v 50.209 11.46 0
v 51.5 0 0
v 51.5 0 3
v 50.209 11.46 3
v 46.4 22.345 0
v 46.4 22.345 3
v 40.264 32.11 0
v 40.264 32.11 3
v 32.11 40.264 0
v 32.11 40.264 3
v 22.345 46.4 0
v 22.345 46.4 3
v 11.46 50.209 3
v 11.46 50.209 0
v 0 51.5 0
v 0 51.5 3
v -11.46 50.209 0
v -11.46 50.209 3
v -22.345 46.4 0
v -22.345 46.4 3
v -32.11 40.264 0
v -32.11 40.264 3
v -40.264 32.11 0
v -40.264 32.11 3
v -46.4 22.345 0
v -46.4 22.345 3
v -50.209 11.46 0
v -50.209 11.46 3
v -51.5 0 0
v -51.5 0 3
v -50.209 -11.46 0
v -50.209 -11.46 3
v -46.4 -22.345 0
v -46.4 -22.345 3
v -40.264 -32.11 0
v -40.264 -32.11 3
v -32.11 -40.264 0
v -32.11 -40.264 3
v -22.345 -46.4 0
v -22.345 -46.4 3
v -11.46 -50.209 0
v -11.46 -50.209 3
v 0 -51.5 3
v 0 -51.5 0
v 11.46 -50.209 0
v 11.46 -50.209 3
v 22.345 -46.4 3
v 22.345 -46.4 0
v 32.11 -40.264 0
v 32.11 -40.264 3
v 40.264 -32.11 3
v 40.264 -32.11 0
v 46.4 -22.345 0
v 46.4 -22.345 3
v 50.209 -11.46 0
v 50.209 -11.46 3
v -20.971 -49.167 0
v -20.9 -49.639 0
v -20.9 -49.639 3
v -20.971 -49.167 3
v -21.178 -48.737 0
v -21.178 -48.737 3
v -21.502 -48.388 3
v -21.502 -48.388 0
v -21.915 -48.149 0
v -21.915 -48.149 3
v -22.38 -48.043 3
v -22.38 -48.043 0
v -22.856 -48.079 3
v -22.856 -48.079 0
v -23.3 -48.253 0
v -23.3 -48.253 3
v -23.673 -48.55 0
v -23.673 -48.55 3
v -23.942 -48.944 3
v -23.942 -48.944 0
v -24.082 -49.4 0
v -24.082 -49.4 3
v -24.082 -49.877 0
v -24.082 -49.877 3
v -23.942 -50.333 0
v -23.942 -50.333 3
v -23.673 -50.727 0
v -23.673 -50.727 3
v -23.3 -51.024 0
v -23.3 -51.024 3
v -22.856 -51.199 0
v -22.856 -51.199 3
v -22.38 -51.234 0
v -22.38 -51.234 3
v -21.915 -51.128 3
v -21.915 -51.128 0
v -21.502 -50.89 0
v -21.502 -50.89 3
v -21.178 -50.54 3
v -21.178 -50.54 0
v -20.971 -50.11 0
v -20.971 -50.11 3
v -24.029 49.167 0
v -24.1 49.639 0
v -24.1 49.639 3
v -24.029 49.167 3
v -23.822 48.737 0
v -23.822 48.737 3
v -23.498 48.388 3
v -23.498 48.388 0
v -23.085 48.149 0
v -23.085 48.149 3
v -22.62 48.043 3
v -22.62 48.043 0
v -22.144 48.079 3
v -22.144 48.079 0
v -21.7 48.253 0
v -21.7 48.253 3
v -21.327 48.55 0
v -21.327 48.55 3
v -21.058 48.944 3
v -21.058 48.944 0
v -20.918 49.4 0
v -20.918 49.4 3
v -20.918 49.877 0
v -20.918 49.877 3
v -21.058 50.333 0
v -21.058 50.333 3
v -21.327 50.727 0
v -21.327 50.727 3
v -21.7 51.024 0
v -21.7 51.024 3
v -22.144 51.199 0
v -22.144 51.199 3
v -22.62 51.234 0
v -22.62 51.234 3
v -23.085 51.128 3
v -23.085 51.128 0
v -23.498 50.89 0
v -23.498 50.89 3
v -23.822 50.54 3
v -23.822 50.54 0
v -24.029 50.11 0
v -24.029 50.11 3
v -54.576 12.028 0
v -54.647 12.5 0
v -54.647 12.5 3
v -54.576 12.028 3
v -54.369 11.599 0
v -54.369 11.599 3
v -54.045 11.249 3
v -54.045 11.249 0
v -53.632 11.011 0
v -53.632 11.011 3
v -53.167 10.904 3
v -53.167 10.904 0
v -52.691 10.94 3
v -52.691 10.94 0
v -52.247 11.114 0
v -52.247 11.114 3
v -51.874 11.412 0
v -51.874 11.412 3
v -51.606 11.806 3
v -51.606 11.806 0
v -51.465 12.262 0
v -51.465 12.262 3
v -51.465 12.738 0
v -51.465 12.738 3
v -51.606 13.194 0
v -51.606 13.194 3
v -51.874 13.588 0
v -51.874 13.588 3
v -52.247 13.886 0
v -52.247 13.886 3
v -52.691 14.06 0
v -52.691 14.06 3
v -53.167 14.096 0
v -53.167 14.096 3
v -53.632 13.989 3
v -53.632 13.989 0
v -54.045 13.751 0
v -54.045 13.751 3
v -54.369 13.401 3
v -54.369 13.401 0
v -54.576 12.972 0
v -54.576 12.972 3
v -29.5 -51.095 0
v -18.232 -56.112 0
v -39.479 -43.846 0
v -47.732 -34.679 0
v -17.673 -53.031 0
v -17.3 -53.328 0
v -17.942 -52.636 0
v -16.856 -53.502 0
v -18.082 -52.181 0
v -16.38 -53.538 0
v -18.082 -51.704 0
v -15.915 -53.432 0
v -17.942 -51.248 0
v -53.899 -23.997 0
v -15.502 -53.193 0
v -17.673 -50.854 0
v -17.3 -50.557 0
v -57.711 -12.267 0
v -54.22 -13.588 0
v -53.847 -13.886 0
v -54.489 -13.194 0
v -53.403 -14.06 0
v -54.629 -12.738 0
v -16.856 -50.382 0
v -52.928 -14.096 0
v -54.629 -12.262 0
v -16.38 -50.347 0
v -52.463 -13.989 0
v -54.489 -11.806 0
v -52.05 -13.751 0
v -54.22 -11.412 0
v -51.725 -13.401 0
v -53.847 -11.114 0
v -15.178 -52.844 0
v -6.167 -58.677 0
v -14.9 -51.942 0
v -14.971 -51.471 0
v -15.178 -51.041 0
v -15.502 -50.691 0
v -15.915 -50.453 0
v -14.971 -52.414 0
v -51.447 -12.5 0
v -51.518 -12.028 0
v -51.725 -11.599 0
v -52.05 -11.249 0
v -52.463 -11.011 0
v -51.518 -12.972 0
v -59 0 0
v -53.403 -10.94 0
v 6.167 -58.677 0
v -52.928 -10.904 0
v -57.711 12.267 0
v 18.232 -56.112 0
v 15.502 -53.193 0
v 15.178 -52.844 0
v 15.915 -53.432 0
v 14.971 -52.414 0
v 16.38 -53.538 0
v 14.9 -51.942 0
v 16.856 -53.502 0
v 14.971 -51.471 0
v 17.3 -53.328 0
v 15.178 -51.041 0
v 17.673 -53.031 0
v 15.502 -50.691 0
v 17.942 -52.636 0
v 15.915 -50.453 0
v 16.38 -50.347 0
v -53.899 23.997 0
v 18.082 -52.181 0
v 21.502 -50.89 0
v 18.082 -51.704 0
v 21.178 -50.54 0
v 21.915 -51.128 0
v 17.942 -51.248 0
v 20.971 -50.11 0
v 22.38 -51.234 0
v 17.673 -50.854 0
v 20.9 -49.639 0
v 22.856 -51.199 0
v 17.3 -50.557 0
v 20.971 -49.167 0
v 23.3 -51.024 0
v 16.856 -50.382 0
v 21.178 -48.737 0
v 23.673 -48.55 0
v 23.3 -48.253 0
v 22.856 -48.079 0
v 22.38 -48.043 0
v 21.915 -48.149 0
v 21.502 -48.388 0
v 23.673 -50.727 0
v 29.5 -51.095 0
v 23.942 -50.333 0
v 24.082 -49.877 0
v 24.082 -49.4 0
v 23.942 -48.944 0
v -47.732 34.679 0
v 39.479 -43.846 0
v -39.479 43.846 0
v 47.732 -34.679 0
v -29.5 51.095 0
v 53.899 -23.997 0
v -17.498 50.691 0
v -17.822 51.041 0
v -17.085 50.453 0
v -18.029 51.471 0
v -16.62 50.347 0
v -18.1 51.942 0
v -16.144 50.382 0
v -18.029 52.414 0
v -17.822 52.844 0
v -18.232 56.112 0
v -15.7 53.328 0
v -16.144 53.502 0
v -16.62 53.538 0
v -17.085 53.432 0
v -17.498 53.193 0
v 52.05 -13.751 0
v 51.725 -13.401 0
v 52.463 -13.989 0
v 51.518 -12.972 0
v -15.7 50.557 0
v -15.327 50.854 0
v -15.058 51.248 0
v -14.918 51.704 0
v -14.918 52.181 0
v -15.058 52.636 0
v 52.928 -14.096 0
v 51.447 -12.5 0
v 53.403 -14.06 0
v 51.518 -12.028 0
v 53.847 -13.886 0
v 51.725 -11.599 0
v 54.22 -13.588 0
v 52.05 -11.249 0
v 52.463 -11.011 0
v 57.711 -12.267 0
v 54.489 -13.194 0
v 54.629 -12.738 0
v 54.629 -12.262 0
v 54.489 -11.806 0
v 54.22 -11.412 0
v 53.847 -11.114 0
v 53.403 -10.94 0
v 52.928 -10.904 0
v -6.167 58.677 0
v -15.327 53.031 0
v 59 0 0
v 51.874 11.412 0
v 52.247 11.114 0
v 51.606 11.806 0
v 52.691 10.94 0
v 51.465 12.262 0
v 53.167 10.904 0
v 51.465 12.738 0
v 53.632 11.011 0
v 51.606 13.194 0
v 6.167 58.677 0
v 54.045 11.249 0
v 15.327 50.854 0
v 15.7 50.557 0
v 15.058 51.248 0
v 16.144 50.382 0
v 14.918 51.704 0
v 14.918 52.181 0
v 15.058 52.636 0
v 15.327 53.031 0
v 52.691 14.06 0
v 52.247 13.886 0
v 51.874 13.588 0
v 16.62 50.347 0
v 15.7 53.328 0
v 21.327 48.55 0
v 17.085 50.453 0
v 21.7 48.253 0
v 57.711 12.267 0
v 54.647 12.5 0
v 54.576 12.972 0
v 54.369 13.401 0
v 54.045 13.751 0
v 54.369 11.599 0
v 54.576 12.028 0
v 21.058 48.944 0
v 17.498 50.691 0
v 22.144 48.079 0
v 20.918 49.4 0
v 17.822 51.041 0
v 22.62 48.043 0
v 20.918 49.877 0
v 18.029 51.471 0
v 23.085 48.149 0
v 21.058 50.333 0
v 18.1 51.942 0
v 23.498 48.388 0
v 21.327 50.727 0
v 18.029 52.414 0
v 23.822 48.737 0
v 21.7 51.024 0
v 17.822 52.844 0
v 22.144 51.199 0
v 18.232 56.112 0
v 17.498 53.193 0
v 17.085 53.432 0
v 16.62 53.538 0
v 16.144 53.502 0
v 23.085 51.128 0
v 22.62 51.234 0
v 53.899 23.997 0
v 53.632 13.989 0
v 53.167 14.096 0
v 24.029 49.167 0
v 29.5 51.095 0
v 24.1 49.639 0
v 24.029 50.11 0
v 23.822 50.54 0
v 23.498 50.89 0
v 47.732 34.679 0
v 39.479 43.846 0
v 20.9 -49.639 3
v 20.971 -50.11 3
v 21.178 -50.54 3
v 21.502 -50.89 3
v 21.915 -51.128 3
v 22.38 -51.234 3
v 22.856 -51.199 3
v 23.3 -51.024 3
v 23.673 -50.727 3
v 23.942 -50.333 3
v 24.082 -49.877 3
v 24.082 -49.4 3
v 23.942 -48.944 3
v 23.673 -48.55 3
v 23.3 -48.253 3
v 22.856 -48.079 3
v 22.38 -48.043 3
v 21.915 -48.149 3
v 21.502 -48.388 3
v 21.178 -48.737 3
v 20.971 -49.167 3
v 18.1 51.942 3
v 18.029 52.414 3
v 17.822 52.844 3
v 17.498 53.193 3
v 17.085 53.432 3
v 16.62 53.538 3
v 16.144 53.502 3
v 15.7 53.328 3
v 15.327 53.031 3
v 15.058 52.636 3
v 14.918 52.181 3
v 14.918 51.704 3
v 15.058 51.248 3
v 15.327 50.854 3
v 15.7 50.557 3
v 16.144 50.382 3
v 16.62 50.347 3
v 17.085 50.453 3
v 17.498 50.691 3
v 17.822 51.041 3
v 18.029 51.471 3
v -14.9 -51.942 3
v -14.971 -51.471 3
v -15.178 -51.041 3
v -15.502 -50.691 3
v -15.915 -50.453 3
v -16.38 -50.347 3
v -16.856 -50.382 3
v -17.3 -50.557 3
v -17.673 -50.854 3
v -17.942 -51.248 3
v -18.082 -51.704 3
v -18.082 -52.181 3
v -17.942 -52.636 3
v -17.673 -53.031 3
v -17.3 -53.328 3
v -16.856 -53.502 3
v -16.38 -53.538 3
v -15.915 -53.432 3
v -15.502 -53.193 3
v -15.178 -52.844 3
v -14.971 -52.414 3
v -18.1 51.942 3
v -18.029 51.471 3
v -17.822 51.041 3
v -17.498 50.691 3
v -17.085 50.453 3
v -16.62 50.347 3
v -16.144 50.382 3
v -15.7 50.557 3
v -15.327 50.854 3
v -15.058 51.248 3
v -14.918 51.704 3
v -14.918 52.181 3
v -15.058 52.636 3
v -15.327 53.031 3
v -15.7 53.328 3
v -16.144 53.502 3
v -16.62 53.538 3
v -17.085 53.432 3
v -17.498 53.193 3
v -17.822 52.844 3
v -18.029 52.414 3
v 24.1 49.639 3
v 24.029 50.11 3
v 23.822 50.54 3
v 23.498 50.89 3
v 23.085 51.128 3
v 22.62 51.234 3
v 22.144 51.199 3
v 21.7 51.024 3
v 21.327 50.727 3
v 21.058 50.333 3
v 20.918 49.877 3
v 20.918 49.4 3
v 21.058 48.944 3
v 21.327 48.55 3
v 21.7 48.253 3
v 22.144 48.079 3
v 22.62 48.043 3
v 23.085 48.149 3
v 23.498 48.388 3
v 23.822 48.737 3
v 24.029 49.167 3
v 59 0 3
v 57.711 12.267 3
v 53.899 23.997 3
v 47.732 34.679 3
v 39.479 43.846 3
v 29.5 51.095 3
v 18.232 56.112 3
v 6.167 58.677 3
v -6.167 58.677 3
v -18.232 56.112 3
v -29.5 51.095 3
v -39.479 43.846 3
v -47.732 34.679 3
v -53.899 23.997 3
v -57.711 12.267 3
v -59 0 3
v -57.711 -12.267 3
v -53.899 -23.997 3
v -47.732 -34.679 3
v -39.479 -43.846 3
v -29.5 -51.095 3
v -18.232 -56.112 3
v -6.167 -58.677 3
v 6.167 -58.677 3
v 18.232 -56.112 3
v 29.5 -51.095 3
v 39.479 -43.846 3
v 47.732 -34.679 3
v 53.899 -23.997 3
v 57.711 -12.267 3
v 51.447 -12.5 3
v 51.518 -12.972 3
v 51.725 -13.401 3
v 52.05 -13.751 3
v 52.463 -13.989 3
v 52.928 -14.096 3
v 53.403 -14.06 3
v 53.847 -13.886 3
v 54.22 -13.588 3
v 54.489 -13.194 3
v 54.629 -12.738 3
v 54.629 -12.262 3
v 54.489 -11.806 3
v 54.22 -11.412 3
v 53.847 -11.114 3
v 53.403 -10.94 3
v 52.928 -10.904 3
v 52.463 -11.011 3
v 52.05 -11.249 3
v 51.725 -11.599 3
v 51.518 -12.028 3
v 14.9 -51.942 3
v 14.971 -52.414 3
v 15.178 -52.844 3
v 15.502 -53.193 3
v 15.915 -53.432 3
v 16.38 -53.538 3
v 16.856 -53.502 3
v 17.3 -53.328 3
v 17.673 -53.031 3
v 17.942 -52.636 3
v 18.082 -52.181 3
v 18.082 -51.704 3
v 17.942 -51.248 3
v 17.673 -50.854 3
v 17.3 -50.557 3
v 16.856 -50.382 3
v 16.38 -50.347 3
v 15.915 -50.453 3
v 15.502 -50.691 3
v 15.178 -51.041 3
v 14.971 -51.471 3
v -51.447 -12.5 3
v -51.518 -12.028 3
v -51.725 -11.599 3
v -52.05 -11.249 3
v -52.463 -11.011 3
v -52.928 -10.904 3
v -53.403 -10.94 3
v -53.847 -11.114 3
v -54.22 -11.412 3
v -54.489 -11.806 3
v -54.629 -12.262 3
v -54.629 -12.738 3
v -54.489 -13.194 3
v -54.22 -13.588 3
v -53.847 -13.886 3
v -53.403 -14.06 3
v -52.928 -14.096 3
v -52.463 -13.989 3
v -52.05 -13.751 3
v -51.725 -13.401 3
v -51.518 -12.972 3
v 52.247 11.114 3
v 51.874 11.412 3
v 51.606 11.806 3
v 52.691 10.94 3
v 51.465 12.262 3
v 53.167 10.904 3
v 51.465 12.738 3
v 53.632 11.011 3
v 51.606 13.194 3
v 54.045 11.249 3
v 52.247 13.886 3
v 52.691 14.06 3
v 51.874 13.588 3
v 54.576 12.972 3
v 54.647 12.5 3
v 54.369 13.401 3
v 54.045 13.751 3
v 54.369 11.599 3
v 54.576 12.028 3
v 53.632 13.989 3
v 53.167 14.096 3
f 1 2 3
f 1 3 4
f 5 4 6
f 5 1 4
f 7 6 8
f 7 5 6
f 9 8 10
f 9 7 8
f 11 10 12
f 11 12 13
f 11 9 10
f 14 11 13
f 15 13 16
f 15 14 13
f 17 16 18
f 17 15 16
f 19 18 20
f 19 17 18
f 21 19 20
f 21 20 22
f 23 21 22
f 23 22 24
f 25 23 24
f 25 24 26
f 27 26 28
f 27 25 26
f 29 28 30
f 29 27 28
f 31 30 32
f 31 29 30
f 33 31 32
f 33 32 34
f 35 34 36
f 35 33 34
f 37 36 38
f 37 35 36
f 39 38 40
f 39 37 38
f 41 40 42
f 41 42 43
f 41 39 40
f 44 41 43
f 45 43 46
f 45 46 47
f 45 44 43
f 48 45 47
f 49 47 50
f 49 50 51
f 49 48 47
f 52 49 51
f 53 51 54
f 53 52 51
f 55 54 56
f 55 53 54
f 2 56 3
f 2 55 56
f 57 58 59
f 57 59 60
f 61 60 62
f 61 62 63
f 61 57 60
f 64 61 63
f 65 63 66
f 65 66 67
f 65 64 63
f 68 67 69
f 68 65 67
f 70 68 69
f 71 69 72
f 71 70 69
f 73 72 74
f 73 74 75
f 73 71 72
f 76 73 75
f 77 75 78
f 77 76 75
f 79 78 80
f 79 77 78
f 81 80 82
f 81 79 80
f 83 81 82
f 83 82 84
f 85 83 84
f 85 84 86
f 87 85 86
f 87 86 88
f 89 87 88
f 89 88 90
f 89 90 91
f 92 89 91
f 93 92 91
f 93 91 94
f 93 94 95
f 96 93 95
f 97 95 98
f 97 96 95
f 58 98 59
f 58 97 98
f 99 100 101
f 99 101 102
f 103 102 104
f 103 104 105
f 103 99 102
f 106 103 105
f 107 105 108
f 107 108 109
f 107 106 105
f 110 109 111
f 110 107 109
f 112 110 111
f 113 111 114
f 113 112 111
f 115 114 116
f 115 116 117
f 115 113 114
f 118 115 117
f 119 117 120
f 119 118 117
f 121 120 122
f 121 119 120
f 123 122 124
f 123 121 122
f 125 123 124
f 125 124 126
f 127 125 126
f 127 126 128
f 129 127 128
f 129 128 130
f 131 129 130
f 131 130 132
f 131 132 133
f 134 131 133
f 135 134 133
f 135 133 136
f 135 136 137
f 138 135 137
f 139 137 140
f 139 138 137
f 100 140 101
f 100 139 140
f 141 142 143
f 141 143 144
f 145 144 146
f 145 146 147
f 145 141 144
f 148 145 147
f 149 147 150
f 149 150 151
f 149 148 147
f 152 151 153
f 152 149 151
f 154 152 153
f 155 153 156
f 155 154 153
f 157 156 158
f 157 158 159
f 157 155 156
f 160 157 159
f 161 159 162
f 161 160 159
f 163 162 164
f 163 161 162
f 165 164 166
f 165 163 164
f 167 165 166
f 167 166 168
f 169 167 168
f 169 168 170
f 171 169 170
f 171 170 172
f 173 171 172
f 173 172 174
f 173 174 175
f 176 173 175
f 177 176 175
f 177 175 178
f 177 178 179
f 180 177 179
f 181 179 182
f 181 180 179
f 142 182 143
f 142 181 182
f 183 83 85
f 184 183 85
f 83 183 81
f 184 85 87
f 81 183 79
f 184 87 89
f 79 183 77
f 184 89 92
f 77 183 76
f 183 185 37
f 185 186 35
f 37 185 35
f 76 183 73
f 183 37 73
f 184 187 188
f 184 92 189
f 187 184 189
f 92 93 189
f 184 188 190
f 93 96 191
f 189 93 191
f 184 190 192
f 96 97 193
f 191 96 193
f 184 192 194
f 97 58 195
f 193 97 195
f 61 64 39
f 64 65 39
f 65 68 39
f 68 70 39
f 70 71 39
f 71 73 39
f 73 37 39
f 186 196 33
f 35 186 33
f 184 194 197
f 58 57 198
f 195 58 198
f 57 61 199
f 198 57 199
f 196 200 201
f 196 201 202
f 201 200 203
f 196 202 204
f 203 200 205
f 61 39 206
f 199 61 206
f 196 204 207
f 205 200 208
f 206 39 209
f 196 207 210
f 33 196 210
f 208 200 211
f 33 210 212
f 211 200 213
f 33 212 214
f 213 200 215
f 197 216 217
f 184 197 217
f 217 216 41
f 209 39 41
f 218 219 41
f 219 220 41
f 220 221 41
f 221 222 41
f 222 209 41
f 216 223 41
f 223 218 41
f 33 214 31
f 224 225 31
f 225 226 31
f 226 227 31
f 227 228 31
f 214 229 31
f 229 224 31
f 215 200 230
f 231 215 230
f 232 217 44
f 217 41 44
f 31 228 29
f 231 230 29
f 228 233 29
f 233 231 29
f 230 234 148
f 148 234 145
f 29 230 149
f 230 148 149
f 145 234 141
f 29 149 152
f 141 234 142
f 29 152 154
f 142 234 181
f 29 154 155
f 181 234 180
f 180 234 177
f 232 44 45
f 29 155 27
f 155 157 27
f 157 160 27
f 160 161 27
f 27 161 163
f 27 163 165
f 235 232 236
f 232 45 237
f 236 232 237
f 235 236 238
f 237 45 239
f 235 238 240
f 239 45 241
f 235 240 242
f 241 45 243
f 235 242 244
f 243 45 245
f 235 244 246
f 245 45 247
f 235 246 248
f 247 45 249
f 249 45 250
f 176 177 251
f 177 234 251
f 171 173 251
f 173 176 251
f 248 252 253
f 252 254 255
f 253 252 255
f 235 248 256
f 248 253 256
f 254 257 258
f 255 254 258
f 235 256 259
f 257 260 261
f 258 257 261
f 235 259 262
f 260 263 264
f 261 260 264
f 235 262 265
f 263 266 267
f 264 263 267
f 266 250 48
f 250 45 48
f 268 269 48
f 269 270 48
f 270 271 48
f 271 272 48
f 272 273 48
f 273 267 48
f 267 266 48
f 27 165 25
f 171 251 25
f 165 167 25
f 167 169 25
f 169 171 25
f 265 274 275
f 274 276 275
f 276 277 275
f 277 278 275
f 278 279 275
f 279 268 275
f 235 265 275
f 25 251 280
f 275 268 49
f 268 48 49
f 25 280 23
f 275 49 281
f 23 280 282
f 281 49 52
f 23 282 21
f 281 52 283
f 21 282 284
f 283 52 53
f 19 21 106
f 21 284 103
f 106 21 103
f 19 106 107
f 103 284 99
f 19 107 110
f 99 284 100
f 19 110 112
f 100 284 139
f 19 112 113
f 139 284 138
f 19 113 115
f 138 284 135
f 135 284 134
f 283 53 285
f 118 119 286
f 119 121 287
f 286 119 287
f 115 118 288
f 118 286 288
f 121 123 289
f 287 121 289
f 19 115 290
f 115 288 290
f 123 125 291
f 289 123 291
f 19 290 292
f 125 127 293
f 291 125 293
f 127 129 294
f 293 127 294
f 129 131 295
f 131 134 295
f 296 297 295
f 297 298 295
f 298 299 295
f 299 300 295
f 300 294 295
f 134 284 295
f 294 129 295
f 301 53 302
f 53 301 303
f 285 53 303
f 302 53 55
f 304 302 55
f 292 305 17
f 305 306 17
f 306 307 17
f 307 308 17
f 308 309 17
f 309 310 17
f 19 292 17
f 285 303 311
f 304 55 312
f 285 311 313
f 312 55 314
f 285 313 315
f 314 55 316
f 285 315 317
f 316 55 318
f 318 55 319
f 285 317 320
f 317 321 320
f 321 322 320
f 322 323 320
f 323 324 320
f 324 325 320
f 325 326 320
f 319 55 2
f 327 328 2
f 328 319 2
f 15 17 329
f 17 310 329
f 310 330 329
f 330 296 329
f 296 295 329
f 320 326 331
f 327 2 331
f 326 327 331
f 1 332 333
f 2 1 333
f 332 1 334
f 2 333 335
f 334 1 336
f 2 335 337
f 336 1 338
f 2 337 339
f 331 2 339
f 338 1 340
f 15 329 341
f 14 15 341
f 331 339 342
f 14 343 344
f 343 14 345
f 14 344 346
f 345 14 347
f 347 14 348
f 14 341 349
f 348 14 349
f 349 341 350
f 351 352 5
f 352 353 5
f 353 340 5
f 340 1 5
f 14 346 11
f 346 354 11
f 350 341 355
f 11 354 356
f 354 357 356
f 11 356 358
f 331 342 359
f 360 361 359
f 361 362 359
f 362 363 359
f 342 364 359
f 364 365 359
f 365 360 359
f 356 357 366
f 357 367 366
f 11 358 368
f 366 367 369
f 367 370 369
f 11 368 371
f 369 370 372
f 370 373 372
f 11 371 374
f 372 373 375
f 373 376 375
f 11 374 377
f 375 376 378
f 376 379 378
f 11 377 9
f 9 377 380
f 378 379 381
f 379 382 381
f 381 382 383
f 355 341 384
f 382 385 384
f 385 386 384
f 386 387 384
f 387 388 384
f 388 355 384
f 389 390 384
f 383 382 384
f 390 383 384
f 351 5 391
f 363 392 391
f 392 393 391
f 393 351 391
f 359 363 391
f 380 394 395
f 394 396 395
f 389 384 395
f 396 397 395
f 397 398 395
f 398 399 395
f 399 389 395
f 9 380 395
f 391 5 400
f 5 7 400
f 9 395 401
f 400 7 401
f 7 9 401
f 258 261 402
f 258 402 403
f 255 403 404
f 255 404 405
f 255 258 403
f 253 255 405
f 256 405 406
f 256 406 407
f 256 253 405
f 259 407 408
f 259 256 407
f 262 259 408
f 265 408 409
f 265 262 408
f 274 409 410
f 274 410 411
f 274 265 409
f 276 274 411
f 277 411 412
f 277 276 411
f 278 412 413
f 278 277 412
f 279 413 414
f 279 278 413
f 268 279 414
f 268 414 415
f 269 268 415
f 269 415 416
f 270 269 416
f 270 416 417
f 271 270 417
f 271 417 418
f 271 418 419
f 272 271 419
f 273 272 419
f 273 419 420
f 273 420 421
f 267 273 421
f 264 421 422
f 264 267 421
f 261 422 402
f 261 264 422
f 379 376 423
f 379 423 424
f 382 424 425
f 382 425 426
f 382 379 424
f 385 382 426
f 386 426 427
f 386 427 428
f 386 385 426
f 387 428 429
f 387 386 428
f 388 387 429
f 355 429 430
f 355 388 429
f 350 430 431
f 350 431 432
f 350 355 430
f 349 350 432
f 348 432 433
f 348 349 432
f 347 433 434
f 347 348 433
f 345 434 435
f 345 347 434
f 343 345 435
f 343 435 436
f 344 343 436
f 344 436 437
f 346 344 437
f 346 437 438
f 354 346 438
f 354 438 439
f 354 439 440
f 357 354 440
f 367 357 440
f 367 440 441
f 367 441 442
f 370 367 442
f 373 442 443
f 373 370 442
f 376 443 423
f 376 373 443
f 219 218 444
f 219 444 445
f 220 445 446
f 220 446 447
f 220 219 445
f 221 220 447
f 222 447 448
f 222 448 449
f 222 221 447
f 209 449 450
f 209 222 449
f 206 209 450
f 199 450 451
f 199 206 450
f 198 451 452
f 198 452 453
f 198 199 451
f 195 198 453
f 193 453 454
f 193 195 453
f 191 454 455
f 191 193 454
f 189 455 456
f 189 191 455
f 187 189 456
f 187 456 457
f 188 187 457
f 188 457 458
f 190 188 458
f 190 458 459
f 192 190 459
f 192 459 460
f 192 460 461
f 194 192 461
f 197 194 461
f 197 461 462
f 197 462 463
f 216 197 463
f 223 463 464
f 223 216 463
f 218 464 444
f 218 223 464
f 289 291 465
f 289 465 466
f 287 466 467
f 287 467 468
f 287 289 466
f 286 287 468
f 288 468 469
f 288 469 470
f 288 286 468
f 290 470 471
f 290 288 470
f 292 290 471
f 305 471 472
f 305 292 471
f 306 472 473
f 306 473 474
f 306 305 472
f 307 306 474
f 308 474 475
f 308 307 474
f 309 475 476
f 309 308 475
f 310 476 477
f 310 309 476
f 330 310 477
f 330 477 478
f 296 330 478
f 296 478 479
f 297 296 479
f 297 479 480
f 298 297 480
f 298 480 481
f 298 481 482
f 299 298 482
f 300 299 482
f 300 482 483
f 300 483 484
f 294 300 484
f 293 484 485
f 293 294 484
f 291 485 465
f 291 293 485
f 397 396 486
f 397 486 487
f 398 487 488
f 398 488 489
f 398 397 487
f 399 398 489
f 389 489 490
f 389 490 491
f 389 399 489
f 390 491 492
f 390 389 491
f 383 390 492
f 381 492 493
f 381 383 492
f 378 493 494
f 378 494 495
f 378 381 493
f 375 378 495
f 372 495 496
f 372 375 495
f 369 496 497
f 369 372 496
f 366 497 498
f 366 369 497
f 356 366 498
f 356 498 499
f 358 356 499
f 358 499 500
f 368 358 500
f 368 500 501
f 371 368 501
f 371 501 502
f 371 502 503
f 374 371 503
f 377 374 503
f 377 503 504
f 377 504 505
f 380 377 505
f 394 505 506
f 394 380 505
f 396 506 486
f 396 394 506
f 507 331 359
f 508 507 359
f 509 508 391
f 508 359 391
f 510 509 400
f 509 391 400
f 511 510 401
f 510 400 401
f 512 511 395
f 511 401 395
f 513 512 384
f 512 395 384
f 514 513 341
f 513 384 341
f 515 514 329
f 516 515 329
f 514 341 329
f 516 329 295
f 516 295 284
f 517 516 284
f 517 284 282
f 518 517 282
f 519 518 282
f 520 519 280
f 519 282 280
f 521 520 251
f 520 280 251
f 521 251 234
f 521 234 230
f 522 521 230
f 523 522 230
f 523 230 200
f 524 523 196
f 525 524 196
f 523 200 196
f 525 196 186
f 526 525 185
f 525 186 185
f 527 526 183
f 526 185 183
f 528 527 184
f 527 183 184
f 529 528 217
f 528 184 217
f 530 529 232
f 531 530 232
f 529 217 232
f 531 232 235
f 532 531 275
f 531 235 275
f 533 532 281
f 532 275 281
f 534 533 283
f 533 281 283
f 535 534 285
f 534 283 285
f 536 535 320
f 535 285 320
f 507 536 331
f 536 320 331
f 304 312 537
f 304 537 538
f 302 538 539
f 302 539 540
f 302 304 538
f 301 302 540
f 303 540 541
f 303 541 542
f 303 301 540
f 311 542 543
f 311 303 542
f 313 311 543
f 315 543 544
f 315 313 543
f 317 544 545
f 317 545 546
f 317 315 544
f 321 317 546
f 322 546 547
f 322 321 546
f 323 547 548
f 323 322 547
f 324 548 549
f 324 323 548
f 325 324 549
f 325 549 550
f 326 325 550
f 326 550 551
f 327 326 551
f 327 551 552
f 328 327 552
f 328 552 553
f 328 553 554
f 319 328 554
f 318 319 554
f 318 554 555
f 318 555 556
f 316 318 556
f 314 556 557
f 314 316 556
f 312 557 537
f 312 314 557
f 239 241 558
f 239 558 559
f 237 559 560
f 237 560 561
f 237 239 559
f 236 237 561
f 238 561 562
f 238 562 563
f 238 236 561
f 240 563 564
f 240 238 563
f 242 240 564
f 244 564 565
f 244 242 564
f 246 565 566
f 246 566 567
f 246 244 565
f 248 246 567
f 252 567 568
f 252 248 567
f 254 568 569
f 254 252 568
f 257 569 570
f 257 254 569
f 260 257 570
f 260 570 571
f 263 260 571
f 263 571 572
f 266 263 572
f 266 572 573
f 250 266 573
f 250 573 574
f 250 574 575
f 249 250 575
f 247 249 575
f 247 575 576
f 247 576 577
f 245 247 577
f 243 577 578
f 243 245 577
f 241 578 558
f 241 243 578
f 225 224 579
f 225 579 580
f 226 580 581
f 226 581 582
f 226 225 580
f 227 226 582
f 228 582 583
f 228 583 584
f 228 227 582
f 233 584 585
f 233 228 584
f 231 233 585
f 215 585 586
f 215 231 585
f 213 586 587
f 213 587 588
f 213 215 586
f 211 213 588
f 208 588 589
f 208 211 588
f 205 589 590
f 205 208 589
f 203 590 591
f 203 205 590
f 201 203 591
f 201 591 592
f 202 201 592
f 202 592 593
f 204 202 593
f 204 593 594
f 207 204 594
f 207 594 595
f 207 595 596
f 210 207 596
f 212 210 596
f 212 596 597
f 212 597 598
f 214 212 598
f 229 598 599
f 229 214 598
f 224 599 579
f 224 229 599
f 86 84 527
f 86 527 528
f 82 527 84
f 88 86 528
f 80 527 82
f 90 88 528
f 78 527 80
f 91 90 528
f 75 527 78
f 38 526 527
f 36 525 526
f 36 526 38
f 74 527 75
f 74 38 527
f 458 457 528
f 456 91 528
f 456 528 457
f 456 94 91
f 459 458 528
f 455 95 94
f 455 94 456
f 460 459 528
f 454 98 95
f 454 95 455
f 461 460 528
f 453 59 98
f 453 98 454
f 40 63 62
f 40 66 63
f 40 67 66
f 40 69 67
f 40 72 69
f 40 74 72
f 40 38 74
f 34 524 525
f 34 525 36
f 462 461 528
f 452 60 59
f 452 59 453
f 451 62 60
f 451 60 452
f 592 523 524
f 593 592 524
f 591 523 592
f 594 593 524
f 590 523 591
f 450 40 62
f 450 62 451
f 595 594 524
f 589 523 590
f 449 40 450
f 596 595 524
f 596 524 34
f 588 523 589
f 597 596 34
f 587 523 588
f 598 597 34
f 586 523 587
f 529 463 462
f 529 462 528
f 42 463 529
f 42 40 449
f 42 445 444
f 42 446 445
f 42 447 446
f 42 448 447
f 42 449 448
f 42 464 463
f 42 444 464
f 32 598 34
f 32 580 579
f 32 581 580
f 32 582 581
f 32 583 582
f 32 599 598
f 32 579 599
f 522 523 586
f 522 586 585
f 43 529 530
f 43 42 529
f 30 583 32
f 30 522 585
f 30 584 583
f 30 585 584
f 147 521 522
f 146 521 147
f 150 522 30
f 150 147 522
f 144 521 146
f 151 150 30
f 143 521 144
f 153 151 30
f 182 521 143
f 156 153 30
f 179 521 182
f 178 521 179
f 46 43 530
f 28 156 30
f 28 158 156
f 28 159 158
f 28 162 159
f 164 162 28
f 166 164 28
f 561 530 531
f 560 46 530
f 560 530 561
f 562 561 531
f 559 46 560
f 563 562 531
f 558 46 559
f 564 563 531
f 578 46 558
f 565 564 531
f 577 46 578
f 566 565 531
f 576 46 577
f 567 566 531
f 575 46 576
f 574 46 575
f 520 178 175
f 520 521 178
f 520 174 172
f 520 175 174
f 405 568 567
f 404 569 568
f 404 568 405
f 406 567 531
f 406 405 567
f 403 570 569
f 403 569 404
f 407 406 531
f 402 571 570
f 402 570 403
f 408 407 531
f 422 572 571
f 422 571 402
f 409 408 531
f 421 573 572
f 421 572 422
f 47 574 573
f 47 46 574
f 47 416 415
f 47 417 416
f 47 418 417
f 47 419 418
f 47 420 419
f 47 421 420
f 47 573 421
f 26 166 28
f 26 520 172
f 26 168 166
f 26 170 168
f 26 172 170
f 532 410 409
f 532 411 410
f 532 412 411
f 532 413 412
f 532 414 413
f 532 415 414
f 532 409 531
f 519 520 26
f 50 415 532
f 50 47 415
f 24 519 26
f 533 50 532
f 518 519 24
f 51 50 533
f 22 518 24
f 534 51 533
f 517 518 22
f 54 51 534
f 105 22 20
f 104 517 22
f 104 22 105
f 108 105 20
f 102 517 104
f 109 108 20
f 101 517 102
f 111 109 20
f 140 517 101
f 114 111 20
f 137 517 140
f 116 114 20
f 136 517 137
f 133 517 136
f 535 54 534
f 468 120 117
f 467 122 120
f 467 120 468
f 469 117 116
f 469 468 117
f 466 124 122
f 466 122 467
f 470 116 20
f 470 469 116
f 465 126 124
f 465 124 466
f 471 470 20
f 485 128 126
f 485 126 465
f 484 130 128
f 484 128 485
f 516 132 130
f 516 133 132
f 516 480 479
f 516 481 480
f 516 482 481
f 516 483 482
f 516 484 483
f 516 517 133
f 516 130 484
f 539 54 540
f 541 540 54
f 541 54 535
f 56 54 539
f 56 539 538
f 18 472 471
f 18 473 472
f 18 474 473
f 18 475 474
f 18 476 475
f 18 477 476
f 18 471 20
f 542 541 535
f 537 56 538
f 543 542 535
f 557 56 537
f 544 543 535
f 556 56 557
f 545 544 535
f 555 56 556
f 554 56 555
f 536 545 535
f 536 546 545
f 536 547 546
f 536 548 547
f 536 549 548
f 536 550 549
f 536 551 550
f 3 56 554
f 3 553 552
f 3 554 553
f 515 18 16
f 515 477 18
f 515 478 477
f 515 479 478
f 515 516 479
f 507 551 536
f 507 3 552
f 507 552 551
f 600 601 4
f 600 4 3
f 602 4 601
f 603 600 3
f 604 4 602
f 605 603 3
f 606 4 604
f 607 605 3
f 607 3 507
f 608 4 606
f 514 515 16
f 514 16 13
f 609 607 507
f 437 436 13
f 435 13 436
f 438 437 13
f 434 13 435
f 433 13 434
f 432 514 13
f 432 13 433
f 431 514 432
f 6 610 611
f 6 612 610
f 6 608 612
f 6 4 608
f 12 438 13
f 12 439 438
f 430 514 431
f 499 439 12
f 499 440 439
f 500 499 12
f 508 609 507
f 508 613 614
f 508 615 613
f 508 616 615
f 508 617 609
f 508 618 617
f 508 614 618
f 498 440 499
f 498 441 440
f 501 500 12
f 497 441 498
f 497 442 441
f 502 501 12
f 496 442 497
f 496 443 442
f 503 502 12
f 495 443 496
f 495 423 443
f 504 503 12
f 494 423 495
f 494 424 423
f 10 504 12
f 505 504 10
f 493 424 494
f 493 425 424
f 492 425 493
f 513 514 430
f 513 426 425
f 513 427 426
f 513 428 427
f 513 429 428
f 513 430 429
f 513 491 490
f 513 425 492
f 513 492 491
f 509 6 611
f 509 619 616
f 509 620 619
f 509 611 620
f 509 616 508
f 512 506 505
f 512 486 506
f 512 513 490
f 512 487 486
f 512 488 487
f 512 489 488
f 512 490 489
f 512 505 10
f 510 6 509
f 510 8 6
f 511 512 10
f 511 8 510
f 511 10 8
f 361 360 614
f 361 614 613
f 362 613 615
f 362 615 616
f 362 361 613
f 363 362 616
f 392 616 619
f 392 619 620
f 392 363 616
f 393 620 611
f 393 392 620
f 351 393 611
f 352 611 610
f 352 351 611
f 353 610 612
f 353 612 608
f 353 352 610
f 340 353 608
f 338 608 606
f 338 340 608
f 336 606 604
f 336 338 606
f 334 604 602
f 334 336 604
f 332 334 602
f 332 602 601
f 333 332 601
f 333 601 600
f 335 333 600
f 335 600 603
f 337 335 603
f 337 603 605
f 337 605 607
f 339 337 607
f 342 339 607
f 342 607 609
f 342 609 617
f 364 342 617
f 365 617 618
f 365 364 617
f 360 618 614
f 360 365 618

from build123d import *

# Parameters (mm, degrees)
SKETCH_1_R      = 59
SKETCH_1_R_2    = 51.5
SKETCH_1_R_3    = 1.6
EXTRUDE_1_DEPTH = 3


with BuildPart() as part:
    # 草图1 → 凸台-拉伸1 (new body)
    with BuildSketch(Plane.XY):
        Circle(SKETCH_1_R)
        Circle(SKETCH_1_R_2, mode=Mode.SUBTRACT)
        with Locations((16.5, 51.942275653)):
            Circle(SKETCH_1_R_3, mode=Mode.SUBTRACT)
        with Locations((22.5, 49.638694584)):
            Circle(SKETCH_1_R_3, mode=Mode.SUBTRACT)
        with Locations((53.047148839, 12.5)):
            Circle(SKETCH_1_R_3, mode=Mode.SUBTRACT)
        with Locations(Location((22.5, -49.638694584, 0), (0, 0, 180))):
            Circle(SKETCH_1_R_3, mode=Mode.SUBTRACT)
        with Locations(Location((16.5, -51.942275653, 0), (0, 0, 180))):
            Circle(SKETCH_1_R_3, mode=Mode.SUBTRACT)
        with Locations(Location((53.047148839, -12.5, 0), (0, 0, 180))):
            Circle(SKETCH_1_R_3, mode=Mode.SUBTRACT)
        with Locations((-16.5, -51.942275653)):
            Circle(SKETCH_1_R_3, mode=Mode.SUBTRACT)
        with Locations((-22.5, -49.638694584)):
            Circle(SKETCH_1_R_3, mode=Mode.SUBTRACT)
        with Locations((-53.047148839, -12.5)):
            Circle(SKETCH_1_R_3, mode=Mode.SUBTRACT)
        with Locations(Location((-53.047148839, 12.5, 0), (0, 0, 180))):
            Circle(SKETCH_1_R_3, mode=Mode.SUBTRACT)
        with Locations(Location((-22.5, 49.638694584, 0), (0, 0, 180))):
            Circle(SKETCH_1_R_3, mode=Mode.SUBTRACT)
        with Locations(Location((-16.5, 51.942275653, 0), (0, 0, 180))):
            Circle(SKETCH_1_R_3, mode=Mode.SUBTRACT)
    extrude(amount=EXTRUDE_1_DEPTH)


solid = part.part
